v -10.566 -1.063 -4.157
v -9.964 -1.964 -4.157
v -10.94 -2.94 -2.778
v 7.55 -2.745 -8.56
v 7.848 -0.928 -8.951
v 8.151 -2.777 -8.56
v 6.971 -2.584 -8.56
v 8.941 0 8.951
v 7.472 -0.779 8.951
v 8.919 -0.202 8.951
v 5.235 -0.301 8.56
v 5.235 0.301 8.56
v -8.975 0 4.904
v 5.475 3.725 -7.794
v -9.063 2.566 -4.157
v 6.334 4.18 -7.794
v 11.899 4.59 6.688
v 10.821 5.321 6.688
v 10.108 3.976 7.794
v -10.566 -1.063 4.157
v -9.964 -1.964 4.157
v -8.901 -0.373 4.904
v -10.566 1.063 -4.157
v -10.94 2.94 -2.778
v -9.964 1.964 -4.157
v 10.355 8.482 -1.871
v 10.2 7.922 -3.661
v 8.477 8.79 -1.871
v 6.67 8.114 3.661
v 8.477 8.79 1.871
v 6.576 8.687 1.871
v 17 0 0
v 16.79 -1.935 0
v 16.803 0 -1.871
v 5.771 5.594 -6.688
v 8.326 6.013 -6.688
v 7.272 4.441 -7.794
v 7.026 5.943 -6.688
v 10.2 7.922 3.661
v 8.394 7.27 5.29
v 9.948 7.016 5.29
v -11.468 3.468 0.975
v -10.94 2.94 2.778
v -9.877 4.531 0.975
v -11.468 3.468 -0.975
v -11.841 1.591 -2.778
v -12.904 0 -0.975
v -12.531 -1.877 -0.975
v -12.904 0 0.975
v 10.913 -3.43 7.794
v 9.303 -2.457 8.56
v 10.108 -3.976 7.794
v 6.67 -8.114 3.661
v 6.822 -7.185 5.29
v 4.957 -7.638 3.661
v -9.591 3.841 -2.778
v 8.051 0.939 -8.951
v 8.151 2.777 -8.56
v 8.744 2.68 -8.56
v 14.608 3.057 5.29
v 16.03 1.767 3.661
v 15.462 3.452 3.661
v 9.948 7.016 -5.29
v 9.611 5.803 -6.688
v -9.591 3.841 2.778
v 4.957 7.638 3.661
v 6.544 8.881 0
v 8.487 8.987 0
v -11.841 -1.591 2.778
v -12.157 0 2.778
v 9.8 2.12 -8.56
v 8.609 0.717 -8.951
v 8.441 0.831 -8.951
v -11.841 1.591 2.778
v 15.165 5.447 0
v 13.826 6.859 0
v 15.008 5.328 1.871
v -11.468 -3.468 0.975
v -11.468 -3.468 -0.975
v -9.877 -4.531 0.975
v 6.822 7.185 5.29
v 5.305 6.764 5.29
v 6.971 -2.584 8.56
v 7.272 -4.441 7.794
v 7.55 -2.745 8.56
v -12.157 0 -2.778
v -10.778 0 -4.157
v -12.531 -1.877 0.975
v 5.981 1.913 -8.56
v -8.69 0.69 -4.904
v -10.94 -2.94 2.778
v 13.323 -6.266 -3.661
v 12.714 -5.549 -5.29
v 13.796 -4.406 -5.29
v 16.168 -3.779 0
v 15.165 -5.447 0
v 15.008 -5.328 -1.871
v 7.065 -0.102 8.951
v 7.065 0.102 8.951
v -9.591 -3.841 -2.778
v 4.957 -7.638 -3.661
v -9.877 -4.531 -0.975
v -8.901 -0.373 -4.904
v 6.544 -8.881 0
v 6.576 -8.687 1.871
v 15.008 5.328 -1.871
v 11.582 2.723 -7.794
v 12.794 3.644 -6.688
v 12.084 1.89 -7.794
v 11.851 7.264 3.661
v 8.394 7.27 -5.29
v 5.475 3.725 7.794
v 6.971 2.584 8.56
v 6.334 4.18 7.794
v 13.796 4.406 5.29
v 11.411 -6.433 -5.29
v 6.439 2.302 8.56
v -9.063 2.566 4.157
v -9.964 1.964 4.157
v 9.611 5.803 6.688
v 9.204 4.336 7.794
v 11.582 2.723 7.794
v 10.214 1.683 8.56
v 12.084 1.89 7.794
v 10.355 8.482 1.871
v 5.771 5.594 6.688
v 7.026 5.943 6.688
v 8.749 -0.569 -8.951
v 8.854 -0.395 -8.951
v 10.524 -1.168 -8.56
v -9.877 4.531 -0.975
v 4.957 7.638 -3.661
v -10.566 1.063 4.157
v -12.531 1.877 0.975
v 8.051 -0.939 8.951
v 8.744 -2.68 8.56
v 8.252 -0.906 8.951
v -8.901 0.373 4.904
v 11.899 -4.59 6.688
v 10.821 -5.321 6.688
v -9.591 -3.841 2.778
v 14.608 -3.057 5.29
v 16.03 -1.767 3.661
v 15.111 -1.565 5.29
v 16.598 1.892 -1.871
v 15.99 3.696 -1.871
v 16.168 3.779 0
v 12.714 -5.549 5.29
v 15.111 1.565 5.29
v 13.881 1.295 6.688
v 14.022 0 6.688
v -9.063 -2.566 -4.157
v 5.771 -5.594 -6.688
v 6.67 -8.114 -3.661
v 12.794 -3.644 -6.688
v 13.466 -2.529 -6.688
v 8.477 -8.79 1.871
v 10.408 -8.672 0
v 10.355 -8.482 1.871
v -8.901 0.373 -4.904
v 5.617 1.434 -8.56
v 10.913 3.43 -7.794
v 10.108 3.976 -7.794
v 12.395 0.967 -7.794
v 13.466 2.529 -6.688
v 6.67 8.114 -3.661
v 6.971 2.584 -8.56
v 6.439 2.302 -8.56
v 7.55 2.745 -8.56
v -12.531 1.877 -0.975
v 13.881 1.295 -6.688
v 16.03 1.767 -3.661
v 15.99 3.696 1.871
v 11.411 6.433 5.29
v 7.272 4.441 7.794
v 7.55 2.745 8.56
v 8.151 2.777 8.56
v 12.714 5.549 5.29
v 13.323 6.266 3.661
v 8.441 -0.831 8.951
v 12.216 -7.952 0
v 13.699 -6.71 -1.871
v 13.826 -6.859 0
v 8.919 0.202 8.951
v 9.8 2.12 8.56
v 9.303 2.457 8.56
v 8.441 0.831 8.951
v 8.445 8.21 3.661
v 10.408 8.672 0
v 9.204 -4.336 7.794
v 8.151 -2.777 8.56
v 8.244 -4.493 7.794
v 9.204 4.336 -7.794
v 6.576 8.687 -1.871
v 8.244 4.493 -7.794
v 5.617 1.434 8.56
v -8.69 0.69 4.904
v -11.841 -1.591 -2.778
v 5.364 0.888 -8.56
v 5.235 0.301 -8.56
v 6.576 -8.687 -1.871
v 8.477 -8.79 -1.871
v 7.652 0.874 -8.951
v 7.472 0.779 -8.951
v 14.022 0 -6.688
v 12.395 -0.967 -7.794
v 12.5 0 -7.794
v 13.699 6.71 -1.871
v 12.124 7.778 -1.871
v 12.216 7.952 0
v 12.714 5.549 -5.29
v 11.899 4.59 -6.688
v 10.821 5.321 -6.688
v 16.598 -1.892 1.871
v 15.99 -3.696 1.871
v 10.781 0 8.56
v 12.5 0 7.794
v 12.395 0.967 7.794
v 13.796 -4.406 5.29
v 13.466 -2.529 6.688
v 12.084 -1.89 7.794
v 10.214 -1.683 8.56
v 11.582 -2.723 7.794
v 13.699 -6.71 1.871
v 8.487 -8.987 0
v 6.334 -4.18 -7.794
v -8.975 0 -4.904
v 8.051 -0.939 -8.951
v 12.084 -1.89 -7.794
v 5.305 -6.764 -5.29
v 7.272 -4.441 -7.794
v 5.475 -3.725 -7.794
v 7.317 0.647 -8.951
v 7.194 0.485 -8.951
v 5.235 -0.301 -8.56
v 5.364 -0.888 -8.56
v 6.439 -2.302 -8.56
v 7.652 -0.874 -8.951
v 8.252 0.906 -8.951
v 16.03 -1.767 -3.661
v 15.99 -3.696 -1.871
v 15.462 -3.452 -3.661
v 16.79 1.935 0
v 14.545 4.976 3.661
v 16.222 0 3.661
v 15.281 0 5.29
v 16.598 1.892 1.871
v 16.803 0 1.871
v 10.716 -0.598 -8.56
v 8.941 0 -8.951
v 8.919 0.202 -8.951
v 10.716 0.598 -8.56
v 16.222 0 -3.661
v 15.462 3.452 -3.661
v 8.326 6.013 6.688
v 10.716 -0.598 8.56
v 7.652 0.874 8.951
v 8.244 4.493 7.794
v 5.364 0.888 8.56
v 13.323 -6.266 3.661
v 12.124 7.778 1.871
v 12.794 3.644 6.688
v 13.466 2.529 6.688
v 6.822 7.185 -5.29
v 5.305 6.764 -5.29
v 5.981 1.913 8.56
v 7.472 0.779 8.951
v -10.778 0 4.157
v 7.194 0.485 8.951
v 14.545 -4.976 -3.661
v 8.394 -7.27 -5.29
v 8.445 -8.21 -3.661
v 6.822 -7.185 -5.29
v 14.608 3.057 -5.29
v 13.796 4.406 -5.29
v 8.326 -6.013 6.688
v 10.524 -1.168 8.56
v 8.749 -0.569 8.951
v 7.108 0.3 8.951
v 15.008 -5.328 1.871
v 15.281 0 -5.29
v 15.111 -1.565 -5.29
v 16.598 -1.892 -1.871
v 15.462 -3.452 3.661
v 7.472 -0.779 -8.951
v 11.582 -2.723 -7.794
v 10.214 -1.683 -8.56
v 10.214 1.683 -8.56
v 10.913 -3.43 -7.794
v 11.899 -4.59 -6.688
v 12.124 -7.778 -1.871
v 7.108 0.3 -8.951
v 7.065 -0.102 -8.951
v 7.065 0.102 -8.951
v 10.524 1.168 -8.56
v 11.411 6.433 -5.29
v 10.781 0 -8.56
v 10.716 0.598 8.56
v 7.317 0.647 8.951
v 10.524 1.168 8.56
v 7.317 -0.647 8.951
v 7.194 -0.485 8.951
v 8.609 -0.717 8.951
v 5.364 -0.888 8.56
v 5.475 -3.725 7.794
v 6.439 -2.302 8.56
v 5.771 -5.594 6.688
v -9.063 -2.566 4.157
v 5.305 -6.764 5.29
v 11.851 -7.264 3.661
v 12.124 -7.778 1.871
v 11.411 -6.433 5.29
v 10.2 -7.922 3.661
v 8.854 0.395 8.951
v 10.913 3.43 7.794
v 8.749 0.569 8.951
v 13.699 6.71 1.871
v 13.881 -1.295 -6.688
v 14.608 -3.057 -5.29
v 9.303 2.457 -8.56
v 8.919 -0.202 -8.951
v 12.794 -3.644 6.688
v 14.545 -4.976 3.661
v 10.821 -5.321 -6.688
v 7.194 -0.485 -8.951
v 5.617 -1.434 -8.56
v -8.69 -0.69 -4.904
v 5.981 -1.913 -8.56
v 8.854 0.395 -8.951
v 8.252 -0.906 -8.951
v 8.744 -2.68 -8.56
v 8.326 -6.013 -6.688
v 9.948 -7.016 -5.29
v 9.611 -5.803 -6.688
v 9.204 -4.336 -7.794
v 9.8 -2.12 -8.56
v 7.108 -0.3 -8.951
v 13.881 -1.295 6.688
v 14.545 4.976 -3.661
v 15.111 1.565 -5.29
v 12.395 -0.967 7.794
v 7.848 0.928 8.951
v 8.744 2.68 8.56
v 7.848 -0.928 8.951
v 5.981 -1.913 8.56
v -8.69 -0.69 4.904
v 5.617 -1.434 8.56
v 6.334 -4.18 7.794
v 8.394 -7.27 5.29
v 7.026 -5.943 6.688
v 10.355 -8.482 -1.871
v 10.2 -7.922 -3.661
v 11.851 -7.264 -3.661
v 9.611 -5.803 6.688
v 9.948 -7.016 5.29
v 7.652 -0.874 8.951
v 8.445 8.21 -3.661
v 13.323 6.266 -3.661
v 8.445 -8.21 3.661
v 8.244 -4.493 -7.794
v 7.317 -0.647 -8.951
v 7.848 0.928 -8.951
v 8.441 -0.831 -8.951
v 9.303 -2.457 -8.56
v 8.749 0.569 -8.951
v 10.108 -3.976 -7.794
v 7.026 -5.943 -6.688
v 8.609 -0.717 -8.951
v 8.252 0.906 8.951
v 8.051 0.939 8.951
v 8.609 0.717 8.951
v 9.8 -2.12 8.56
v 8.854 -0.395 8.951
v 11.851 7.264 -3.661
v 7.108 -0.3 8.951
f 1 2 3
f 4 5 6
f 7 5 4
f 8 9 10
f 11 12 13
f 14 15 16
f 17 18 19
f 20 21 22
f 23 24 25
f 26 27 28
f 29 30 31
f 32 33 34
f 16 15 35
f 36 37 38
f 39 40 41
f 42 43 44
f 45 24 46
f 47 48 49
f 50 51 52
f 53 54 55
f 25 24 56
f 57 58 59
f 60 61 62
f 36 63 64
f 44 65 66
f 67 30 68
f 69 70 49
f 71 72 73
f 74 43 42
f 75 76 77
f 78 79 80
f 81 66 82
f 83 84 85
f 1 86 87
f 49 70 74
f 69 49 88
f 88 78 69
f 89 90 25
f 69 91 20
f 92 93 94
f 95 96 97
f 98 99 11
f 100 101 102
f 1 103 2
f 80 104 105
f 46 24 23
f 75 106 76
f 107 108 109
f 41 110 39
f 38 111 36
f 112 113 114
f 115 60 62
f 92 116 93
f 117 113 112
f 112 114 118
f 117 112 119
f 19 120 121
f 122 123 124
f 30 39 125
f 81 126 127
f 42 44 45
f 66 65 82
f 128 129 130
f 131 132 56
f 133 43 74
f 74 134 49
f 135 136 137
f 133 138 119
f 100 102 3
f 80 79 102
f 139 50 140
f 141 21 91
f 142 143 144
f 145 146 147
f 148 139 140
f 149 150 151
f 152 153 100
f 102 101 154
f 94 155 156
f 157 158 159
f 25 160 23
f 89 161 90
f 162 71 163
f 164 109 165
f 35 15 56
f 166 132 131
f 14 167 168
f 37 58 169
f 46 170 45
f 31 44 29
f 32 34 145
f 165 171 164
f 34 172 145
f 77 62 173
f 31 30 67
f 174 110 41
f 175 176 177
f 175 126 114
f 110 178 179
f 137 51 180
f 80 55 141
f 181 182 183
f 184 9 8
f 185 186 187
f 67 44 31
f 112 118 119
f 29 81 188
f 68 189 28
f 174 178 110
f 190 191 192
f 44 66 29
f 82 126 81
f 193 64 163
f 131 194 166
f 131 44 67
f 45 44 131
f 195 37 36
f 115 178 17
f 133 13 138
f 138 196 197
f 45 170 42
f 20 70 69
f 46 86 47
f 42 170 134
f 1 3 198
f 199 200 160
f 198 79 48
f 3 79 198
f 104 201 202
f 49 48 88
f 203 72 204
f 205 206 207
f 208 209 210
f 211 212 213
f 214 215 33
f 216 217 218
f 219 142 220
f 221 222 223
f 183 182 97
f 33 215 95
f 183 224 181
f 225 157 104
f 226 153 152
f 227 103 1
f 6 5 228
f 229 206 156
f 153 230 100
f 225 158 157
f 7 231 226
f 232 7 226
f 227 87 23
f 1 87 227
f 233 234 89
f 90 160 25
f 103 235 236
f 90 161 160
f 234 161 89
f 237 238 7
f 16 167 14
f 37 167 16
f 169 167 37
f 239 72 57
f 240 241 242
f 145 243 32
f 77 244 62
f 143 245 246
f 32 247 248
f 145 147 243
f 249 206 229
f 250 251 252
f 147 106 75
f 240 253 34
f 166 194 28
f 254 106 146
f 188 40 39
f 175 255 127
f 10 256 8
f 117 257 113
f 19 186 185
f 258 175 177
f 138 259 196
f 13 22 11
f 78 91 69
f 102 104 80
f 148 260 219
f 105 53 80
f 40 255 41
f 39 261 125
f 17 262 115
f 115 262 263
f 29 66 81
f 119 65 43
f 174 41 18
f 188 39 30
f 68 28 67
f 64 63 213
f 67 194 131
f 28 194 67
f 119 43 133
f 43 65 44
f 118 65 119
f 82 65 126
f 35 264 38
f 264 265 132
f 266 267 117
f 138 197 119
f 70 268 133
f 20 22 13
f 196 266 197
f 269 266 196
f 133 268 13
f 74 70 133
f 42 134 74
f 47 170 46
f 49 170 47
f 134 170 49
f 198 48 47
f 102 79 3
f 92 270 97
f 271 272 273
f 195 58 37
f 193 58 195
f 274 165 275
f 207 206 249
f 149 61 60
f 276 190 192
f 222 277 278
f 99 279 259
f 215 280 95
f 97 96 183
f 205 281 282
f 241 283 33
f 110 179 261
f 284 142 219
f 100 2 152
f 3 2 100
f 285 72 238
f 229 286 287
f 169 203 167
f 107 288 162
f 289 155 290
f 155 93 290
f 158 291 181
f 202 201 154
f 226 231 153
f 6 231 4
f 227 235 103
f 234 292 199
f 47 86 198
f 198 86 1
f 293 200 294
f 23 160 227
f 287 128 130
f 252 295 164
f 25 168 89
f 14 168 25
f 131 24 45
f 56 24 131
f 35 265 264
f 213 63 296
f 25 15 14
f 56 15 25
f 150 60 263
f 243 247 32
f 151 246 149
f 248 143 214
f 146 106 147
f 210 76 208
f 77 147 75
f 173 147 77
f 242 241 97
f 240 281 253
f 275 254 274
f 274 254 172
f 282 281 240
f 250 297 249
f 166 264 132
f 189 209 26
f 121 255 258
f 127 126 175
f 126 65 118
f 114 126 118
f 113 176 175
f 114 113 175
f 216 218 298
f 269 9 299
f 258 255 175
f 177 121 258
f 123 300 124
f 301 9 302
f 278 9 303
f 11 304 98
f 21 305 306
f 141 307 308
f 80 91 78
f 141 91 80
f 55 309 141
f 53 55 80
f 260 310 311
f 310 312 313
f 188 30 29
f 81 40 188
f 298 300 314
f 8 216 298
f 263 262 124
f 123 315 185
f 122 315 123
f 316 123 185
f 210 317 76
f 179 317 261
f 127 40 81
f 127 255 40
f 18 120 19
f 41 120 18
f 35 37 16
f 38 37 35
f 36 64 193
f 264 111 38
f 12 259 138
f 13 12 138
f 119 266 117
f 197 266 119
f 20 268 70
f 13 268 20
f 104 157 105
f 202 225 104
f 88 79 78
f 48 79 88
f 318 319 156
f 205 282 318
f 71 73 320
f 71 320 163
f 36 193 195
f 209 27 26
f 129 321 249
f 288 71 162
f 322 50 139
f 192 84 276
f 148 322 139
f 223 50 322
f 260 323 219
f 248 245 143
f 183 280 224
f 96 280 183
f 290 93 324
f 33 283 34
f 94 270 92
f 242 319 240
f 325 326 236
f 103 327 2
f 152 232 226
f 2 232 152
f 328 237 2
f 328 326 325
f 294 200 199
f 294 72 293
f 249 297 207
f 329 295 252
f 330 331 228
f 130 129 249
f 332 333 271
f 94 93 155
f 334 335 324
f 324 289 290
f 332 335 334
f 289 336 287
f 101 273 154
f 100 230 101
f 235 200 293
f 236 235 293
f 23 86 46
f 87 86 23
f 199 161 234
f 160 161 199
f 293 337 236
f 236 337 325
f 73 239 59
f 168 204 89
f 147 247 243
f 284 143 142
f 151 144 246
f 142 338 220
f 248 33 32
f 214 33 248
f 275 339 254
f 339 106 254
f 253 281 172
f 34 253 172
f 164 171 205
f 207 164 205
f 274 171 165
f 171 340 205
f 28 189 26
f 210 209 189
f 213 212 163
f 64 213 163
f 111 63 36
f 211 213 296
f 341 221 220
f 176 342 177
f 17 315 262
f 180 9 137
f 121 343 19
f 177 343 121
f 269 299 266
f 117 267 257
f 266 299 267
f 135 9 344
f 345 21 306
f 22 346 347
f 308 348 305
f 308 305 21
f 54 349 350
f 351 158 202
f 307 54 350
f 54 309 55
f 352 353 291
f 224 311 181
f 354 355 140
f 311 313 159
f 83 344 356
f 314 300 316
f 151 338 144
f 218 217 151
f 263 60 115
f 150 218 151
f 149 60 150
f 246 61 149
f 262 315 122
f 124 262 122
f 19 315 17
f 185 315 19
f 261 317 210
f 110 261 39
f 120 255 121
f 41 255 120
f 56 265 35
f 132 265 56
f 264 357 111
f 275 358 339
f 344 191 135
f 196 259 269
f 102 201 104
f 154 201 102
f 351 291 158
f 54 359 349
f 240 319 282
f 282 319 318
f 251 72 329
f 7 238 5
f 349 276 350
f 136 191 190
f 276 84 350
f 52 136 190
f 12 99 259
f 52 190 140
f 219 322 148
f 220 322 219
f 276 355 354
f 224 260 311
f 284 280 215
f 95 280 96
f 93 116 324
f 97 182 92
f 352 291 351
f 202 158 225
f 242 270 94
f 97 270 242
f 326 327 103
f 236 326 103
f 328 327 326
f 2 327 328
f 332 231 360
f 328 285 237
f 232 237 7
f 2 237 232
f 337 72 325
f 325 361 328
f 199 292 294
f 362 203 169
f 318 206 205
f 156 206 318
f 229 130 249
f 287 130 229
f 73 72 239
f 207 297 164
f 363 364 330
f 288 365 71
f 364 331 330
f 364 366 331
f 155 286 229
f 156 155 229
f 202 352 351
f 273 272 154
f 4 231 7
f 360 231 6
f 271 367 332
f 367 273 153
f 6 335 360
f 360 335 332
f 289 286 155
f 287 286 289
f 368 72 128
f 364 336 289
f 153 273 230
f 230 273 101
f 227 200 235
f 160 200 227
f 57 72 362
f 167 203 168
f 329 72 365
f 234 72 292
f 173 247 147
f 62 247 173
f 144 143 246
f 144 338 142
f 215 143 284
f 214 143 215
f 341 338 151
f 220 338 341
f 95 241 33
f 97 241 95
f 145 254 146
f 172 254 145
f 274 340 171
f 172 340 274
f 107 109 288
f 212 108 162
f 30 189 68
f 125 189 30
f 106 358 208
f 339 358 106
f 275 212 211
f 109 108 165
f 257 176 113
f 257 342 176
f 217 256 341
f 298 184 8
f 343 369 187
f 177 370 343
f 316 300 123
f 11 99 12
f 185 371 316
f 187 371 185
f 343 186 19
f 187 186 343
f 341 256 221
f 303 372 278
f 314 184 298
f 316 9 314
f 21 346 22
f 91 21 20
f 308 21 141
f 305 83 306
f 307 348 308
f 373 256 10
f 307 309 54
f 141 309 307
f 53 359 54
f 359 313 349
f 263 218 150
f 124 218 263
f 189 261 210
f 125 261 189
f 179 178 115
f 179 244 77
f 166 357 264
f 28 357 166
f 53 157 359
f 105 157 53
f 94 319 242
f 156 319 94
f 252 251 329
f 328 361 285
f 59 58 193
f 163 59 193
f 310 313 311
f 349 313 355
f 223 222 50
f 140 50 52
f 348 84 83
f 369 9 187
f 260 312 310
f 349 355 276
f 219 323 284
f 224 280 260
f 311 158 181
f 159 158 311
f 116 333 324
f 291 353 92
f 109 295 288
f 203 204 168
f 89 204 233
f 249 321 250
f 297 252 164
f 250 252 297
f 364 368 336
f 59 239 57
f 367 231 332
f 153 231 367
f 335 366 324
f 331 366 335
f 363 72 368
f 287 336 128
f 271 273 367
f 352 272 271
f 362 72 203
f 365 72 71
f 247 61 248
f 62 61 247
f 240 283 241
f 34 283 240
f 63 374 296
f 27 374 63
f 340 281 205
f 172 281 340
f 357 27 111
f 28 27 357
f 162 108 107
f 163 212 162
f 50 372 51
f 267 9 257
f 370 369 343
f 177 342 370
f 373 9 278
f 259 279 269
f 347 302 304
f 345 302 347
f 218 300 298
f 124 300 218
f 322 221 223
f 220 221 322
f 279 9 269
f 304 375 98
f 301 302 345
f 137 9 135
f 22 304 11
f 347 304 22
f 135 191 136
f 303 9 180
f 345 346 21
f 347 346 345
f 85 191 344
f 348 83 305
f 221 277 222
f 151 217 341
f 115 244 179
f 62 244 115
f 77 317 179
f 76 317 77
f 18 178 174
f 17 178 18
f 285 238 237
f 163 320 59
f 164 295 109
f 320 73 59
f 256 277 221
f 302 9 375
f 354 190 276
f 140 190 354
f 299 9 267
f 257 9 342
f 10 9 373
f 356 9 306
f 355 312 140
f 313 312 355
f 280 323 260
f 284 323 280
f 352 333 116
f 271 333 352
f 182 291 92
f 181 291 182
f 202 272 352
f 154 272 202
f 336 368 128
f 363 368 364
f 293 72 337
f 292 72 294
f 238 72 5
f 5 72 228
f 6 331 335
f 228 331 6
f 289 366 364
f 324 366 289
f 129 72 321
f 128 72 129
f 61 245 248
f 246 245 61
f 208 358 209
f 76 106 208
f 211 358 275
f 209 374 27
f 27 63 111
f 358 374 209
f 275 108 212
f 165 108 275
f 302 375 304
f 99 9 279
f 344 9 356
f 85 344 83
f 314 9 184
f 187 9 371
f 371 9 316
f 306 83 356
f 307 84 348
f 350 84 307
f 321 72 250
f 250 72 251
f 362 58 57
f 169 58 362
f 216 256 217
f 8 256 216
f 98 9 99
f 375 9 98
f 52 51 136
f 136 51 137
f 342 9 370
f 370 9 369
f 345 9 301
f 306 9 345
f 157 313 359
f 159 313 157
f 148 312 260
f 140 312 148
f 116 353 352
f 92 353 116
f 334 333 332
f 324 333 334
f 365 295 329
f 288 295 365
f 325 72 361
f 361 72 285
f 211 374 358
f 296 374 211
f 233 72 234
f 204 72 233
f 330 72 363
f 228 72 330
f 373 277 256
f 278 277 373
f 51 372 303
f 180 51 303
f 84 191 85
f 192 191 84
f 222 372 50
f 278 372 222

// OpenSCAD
hull() {
    translate([-8, 0, 0]) sphere(r = 5);
    translate([8, 0, 0]) sphere(r = 9);
}
